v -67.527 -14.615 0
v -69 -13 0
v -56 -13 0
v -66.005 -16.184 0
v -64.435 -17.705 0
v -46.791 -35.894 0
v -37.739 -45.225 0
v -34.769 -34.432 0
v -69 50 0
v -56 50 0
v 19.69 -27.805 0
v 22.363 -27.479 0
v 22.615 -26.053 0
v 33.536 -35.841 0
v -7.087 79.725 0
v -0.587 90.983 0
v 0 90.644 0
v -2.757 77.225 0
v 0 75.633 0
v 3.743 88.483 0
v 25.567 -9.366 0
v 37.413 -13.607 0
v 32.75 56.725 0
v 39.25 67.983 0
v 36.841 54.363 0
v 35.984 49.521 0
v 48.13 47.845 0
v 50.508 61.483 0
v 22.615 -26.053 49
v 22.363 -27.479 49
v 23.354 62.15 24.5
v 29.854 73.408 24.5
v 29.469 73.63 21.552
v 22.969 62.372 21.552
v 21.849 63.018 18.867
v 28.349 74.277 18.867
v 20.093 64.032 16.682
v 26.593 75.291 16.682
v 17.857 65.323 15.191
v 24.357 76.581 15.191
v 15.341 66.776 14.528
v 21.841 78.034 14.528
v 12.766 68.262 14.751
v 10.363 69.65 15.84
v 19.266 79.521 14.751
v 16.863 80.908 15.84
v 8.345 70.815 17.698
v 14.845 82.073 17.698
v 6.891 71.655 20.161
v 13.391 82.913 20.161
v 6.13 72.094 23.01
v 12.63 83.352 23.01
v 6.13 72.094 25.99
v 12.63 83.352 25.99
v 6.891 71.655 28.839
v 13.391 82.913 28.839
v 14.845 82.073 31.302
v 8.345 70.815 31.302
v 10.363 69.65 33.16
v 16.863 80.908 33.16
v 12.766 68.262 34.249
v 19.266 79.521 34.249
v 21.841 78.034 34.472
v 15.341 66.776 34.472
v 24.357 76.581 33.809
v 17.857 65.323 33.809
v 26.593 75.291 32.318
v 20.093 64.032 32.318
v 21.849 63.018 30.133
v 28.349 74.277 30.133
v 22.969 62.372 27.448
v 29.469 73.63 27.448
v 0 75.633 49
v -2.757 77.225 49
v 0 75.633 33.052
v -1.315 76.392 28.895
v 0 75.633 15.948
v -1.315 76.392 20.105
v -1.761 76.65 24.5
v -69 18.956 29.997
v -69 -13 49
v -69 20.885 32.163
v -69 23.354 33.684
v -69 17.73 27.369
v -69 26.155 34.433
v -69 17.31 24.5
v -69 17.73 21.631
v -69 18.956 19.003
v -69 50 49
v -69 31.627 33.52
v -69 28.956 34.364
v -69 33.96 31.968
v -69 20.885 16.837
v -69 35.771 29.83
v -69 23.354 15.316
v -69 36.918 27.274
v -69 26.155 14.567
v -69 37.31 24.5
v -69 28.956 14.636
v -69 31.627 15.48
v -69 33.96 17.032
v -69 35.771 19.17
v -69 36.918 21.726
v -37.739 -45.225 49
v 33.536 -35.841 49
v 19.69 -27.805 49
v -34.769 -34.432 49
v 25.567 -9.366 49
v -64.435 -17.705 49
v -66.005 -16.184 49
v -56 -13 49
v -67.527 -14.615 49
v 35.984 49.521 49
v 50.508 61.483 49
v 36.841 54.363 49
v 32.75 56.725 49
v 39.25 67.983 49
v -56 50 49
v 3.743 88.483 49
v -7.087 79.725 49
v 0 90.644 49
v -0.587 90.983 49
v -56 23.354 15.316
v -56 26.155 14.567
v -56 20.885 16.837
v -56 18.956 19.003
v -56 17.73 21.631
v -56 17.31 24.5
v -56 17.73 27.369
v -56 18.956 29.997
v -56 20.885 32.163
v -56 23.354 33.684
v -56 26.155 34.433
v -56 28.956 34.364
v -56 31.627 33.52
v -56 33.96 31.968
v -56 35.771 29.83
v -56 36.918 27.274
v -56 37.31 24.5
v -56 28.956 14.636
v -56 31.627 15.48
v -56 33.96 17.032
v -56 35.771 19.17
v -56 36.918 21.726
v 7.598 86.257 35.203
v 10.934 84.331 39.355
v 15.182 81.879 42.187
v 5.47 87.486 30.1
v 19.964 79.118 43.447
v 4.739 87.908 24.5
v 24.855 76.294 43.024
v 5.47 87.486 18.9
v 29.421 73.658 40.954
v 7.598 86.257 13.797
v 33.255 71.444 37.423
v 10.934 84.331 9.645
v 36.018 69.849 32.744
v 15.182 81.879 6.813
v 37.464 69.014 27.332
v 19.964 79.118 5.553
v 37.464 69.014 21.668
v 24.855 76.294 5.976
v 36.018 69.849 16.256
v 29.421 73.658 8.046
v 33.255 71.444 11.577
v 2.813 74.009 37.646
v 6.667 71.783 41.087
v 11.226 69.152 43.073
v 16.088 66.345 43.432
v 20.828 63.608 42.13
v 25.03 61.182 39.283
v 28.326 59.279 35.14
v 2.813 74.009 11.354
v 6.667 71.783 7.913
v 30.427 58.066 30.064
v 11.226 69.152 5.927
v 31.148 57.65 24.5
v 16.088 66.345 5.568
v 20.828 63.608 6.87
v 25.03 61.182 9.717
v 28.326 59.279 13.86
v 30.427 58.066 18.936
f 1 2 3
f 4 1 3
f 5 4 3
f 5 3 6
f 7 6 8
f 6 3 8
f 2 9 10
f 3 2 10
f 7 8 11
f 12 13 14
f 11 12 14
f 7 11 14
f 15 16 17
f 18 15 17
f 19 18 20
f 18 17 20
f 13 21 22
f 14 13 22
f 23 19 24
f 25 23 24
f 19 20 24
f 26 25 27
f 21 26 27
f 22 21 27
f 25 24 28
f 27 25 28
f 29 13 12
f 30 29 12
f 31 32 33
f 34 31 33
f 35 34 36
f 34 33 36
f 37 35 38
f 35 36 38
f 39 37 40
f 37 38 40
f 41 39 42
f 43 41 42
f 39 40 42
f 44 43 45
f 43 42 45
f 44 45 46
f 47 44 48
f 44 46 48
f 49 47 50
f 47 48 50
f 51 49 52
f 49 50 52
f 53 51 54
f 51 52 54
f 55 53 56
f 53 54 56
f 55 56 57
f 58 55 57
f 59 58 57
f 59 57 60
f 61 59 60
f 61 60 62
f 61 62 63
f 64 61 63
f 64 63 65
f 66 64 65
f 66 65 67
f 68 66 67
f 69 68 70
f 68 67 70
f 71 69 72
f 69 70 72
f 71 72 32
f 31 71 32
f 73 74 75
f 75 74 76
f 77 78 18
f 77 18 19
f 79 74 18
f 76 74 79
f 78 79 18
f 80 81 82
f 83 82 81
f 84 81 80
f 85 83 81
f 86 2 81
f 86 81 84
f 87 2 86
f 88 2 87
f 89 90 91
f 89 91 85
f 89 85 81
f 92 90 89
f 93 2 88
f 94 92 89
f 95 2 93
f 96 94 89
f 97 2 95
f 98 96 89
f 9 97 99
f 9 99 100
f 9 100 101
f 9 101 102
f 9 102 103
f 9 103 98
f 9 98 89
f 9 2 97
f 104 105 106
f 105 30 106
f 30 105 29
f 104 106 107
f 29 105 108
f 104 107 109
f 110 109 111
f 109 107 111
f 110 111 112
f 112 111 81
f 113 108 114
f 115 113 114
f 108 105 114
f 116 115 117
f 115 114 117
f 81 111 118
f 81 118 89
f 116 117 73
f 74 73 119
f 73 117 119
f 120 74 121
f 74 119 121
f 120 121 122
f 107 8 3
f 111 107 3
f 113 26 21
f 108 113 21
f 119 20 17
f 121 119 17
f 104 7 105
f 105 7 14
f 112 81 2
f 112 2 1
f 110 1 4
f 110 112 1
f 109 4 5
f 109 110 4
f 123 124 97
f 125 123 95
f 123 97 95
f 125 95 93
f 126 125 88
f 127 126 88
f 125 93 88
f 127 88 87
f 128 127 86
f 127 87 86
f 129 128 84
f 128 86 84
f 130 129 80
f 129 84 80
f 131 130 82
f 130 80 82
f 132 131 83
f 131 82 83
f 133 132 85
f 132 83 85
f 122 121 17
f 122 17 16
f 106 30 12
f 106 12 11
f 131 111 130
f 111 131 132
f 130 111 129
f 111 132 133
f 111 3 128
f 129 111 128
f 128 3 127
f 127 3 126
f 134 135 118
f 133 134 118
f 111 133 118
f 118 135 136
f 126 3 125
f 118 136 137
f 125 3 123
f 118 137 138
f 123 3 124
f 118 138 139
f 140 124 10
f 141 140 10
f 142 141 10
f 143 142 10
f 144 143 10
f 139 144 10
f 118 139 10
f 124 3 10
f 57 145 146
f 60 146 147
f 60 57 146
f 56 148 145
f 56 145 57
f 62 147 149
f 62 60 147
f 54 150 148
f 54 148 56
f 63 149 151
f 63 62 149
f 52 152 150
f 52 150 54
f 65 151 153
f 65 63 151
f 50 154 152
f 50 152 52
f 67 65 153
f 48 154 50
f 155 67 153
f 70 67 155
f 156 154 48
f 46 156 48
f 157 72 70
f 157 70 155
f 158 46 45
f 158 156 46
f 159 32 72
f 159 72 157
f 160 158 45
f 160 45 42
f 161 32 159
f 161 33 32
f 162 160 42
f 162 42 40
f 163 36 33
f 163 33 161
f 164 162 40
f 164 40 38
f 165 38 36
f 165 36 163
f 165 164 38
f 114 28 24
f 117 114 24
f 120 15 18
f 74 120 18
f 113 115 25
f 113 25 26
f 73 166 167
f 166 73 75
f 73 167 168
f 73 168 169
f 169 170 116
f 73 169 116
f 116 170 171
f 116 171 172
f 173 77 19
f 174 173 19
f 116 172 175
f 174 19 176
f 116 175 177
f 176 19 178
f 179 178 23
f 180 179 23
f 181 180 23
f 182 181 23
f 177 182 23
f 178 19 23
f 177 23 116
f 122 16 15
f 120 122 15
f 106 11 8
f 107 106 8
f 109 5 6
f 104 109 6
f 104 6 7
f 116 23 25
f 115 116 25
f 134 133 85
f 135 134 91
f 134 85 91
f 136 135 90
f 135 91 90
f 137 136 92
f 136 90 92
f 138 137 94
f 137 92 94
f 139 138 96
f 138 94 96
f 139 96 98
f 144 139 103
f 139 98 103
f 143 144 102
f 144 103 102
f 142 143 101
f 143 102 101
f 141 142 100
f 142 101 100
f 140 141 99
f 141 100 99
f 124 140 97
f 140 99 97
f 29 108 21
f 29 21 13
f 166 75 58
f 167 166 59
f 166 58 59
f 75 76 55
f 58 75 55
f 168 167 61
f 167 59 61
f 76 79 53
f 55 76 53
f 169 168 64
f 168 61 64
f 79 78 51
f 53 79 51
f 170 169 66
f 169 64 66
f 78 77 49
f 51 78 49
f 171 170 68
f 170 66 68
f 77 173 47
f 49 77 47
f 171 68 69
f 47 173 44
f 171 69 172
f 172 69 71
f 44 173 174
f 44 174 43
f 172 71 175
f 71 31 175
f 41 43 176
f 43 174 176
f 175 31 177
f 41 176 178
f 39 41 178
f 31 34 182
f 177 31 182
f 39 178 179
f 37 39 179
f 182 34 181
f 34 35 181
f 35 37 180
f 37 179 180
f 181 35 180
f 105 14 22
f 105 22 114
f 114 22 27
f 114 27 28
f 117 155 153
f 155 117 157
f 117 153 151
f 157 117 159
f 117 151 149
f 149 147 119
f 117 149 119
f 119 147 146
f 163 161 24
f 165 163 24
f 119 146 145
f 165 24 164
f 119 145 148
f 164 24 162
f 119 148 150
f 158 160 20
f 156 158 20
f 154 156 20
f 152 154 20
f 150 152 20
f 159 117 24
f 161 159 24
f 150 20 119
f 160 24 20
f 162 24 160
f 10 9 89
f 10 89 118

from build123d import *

# Parameters (mm, degrees)
BOSS_EXTRUDE3_DEPTH      = 49
SKETCH5_R                = 19
CUT_EXTRUDE2_DEPTH       = 49
SKETCH6_R                = 19
CUT_EXTRUDE3_DEPTH       = 49
SKETCH9_R                = 19
SKETCH9_R_2              = 10
BOSS_EXTRUDE4_DEPTH      = 13
SKETCH11_R               = 19
SKETCH11_R_2             = 10
BOSS_EXTRUDE5_DEPTH      = 13
BOSS_EXTRUDE6_DEPTH      = 58
CUT_EXTRUDE4_DEPTH       = 58
CUT_EXTRUDE5_DEPTH       = 184
BOSS_EXTRUDE7_DEPTH      = 3
BOSS_EXTRUDE7_DEPTH_BACK = 20
SKETCH18_W               = 9.328805748
SKETCH18_H               = 21.574307968
SKETCH18_W_2             = 22.550774564
SKETCH18_H_2             = 22.755980238
CUT_EXTRUDE6_DEPTH       = 535
CUT_EXTRUDE7_START       = -29
SKETCH19_R               = 10
CUT_EXTRUDE7_DEPTH       = 29
BOSS_EXTRUDE12_DEPTH     = 284
CUT_EXTRUDE9_DEPTH       = 284
BOSS_EXTRUDE13_START     = 154
BOSS_EXTRUDE13_DEPTH     = 154
SKETCH27_W               = 285.503749152
SKETCH27_H               = 203.662610786
CUT_EXTRUDE12_DEPTH      = 199
CUT_EXTRUDE13_DEPTH      = 73


with BuildPart() as part:
    # Sketch1 → Boss-Extrude3 (new body)
    with BuildSketch(Plane.XY):
        Polygon((7.505553499, -13), (50.508330249, 61.482994197), (-0.587168574, 90.982994197), (-7.087168574, 79.724663948), (32.75, 56.724663948), (0, 0), (-56, 0), (-56, 50), (-69, 50), (-69, -13), align=None)
    extrude(amount=BOSS_EXTRUDE3_DEPTH)

    # Sketch5 → Cut-Extrude2 (cut)
    with BuildSketch(Plane.ZY.offset(69)):
        with Locations((24.5, 25)):
            Circle(SKETCH5_R)
    extrude(amount=-CUT_EXTRUDE2_DEPTH, mode=Mode.SUBTRACT)

    # Sketch6 → Cut-Extrude3 (cut)
    with BuildSketch(Plane(origin=(39.25, 67.982994197, 0), x_dir=(0.8660254037844385, -0.5000000000000003, 0), z_dir=(0.5000000000000003, 0.8660254037844386, 0))):
        with Locations((-20.85, -24.5)):
            Circle(SKETCH6_R)
    extrude(amount=-CUT_EXTRUDE3_DEPTH, mode=Mode.SUBTRACT)

    # Sketch9 → Boss-Extrude4 (add)
    with BuildSketch(Plane(origin=(39.25, 67.982994197, 0), x_dir=(0.8660254037844385, -0.5000000000000003, 0), z_dir=(0.5000000000000003, 0.8660254037844386, 0))):
        with Locations((-20.85, -24.5)):
            Circle(SKETCH9_R)
        with Locations((-20.85, -24.5)):
            Circle(SKETCH9_R_2, mode=Mode.SUBTRACT)
    extrude(amount=-BOSS_EXTRUDE4_DEPTH)

    # Sketch11 → Boss-Extrude5 (add)
    with BuildSketch(Plane.ZY.offset(69)):
        with Locations((24.5, 25)):
            Circle(SKETCH11_R)
        with Locations((24.5, 25)):
            Circle(SKETCH11_R_2, mode=Mode.SUBTRACT)
    extrude(amount=-BOSS_EXTRUDE5_DEPTH)

    # Sketch12 → Boss-Extrude6 (add)
    with BuildSketch(Plane.XY.offset(49)):
        with BuildLine():
            Line((50.508330249, 61.482994197), (32.75, 56.724663948))
            ThreePointArc((32.75, 56.724663948), (16.910177277, -16.283097494), (-56, 0))
            Line((-56, 0), (-69, -13))
            ThreePointArc((-69, -13), (22.244773258, -26.285338417), (50.508330249, 61.482994197))
        make_face()
    extrude(amount=-BOSS_EXTRUDE6_DEPTH)

    # Sketch13 → Cut-Extrude4 (cut)
    with BuildSketch(Plane.XY.offset(49)):
        Polygon((32.75, 56.724663948), (39.316517917, 42.098206609), (7.505553499, -13), (-44.392822704, -13), (-56, 0), (0, 0), align=None)
    extrude(amount=-CUT_EXTRUDE4_DEPTH, mode=Mode.SUBTRACT)

    # Sketch16 → Cut-Extrude5 (cut)
    with BuildSketch(Plane.ZY.offset(69)):
        Polygon((-20.067670538, -13), (-20.067670538, 53.233474558), (-20.067670538, 98.990821442), (0, 98.990821442), (0, 53.233474558), (0, -13), (0, -105.844145432), (-20.067670538, -105.844145432), align=None)
    extrude(amount=-CUT_EXTRUDE5_DEPTH, mode=Mode.SUBTRACT)

    # Sketch17 → Boss-Extrude7 (add, two sides: drawn at the far end of the back side and taken through both)
    with BuildSketch(Plane.ZY.offset(69).offset(-BOSS_EXTRUDE7_DEPTH_BACK)):
        with BuildLine():
            ThreePointArc((34.433074801, 26.155), (24.5, 17.31), (14.566925199, 26.155))
            ThreePointArc((14.566925199, 26.155), (23.921531336, 15.01674532), (34.5, 25))
            ThreePointArc((34.5, 25), (34.48325468, 25.578468664), (34.433074801, 26.155))
        make_face()
    extrude(amount=BOSS_EXTRUDE7_DEPTH + BOSS_EXTRUDE7_DEPTH_BACK)

    # Sketch18 → Cut-Extrude6 (cut)
    with BuildSketch(Plane(origin=(0, 0, 0), x_dir=(-1, 0, 0), z_dir=(0, 0, -1))):
        with Locations((51.335597126, 20.158741433)):
            Rectangle(SKETCH18_W, SKETCH18_H)
        with Locations((80.275387282, 19.567905298)):
            Rectangle(SKETCH18_W_2, SKETCH18_H_2)
    extrude(amount=-CUT_EXTRUDE6_DEPTH, mode=Mode.SUBTRACT)

    # Sketch19 → Cut-Extrude7 (cut)
    with BuildSketch(Plane.ZY.offset(69).offset(CUT_EXTRUDE7_START)):
        with Locations((24.5, 27.31)):
            Circle(SKETCH19_R)
    extrude(amount=CUT_EXTRUDE7_DEPTH, mode=Mode.SUBTRACT)

    # Sketch21 → Boss-Extrude12 (add)
    with BuildSketch(Plane(origin=(0, 0, 0), x_dir=(-1, 0, 0), z_dir=(0, 0, -1))):
        Polygon((37.73885384, -45.225386792), (69, -13), (56, -13), (37.73885384, -31.461636701), (34.768910635, -34.431579906), (-22.363127135, -27.479360202), (-36.840667723, 54.362915837), (-48.129988201, 47.84502362), (-33.53595077, -35.840606547), align=None)
    extrude(amount=BOSS_EXTRUDE12_DEPTH)

    # Sketch23 → Cut-Extrude9 (cut)
    with BuildSketch(Plane(origin=(0, 0, 0), x_dir=(-1, 0, 0), z_dir=(0, 0, -1))):
        Polygon((-66.888962861, -18.747024991), (-37.413342103, -13.606736129), (-50.508330249, 61.482994197), (-79.983951007, 56.342705335), align=None)
        Polygon((56, 0), (-32.75, 56.724663948), (-35.984130282, 49.520865954), (-22.363127135, -27.479360202), (34.768910635, -34.431579906), (56, -13), align=None)
    extrude(amount=-CUT_EXTRUDE9_DEPTH, mode=Mode.SUBTRACT)

    # Sketch26 → Boss-Extrude13 (add)
    with BuildSketch(Plane.XY.offset(BOSS_EXTRUDE13_START)):
        with BuildLine():
            ThreePointArc((19.690093366, -27.804633355), (-24.032626354, -36.581822551), (-64.435496773, -17.705293954))
            Line((-64.435496773, -17.705293954), (-37.73885384, -45.225386792))
            Line((-37.73885384, -45.225386792), (33.53595077, -35.840606547))
            Line((33.53595077, -35.840606547), (48.129988201, 47.84502362))
            Line((48.129988201, 47.84502362), (35.984130282, 49.520865954))
            Line((35.984130282, 49.520865954), (22.363127135, -27.479360202))
            Line((22.363127135, -27.479360202), (19.690093366, -27.804633355))
        make_face()
    extrude(amount=-BOSS_EXTRUDE13_DEPTH)

    # Sketch27 → Cut-Extrude12 (cut)
    with BuildSketch(Plane(origin=(39.25, 67.982994197, 0), x_dir=(0.8660254037844385, -0.5000000000000003, 0), z_dir=(0.5000000000000003, 0.8660254037844386, 0))):
        with Locations((-30.536562906, -150.831305393)):
            Rectangle(SKETCH27_W, SKETCH27_H)
        Polygon((-173.288437482, 0), (177.590878736, 0), (177.590878736, 352.418162382), (-178.957111939, 352.418162382), (-178.957111939, 168.477547877), (-173.288437482, 168.477547877), align=None)
    extrude(amount=-CUT_EXTRUDE12_DEPTH, mode=Mode.SUBTRACT)

    # Sketch28 → Cut-Extrude13 (cut)
    with BuildSketch(Plane.XY.offset(49)):
        Polygon((32.75, 56.724663948), (36.840667723, 54.362915837), (35.984130282, 49.520865954), align=None)
    extrude(amount=-CUT_EXTRUDE13_DEPTH, mode=Mode.SUBTRACT)


solid = part.part
